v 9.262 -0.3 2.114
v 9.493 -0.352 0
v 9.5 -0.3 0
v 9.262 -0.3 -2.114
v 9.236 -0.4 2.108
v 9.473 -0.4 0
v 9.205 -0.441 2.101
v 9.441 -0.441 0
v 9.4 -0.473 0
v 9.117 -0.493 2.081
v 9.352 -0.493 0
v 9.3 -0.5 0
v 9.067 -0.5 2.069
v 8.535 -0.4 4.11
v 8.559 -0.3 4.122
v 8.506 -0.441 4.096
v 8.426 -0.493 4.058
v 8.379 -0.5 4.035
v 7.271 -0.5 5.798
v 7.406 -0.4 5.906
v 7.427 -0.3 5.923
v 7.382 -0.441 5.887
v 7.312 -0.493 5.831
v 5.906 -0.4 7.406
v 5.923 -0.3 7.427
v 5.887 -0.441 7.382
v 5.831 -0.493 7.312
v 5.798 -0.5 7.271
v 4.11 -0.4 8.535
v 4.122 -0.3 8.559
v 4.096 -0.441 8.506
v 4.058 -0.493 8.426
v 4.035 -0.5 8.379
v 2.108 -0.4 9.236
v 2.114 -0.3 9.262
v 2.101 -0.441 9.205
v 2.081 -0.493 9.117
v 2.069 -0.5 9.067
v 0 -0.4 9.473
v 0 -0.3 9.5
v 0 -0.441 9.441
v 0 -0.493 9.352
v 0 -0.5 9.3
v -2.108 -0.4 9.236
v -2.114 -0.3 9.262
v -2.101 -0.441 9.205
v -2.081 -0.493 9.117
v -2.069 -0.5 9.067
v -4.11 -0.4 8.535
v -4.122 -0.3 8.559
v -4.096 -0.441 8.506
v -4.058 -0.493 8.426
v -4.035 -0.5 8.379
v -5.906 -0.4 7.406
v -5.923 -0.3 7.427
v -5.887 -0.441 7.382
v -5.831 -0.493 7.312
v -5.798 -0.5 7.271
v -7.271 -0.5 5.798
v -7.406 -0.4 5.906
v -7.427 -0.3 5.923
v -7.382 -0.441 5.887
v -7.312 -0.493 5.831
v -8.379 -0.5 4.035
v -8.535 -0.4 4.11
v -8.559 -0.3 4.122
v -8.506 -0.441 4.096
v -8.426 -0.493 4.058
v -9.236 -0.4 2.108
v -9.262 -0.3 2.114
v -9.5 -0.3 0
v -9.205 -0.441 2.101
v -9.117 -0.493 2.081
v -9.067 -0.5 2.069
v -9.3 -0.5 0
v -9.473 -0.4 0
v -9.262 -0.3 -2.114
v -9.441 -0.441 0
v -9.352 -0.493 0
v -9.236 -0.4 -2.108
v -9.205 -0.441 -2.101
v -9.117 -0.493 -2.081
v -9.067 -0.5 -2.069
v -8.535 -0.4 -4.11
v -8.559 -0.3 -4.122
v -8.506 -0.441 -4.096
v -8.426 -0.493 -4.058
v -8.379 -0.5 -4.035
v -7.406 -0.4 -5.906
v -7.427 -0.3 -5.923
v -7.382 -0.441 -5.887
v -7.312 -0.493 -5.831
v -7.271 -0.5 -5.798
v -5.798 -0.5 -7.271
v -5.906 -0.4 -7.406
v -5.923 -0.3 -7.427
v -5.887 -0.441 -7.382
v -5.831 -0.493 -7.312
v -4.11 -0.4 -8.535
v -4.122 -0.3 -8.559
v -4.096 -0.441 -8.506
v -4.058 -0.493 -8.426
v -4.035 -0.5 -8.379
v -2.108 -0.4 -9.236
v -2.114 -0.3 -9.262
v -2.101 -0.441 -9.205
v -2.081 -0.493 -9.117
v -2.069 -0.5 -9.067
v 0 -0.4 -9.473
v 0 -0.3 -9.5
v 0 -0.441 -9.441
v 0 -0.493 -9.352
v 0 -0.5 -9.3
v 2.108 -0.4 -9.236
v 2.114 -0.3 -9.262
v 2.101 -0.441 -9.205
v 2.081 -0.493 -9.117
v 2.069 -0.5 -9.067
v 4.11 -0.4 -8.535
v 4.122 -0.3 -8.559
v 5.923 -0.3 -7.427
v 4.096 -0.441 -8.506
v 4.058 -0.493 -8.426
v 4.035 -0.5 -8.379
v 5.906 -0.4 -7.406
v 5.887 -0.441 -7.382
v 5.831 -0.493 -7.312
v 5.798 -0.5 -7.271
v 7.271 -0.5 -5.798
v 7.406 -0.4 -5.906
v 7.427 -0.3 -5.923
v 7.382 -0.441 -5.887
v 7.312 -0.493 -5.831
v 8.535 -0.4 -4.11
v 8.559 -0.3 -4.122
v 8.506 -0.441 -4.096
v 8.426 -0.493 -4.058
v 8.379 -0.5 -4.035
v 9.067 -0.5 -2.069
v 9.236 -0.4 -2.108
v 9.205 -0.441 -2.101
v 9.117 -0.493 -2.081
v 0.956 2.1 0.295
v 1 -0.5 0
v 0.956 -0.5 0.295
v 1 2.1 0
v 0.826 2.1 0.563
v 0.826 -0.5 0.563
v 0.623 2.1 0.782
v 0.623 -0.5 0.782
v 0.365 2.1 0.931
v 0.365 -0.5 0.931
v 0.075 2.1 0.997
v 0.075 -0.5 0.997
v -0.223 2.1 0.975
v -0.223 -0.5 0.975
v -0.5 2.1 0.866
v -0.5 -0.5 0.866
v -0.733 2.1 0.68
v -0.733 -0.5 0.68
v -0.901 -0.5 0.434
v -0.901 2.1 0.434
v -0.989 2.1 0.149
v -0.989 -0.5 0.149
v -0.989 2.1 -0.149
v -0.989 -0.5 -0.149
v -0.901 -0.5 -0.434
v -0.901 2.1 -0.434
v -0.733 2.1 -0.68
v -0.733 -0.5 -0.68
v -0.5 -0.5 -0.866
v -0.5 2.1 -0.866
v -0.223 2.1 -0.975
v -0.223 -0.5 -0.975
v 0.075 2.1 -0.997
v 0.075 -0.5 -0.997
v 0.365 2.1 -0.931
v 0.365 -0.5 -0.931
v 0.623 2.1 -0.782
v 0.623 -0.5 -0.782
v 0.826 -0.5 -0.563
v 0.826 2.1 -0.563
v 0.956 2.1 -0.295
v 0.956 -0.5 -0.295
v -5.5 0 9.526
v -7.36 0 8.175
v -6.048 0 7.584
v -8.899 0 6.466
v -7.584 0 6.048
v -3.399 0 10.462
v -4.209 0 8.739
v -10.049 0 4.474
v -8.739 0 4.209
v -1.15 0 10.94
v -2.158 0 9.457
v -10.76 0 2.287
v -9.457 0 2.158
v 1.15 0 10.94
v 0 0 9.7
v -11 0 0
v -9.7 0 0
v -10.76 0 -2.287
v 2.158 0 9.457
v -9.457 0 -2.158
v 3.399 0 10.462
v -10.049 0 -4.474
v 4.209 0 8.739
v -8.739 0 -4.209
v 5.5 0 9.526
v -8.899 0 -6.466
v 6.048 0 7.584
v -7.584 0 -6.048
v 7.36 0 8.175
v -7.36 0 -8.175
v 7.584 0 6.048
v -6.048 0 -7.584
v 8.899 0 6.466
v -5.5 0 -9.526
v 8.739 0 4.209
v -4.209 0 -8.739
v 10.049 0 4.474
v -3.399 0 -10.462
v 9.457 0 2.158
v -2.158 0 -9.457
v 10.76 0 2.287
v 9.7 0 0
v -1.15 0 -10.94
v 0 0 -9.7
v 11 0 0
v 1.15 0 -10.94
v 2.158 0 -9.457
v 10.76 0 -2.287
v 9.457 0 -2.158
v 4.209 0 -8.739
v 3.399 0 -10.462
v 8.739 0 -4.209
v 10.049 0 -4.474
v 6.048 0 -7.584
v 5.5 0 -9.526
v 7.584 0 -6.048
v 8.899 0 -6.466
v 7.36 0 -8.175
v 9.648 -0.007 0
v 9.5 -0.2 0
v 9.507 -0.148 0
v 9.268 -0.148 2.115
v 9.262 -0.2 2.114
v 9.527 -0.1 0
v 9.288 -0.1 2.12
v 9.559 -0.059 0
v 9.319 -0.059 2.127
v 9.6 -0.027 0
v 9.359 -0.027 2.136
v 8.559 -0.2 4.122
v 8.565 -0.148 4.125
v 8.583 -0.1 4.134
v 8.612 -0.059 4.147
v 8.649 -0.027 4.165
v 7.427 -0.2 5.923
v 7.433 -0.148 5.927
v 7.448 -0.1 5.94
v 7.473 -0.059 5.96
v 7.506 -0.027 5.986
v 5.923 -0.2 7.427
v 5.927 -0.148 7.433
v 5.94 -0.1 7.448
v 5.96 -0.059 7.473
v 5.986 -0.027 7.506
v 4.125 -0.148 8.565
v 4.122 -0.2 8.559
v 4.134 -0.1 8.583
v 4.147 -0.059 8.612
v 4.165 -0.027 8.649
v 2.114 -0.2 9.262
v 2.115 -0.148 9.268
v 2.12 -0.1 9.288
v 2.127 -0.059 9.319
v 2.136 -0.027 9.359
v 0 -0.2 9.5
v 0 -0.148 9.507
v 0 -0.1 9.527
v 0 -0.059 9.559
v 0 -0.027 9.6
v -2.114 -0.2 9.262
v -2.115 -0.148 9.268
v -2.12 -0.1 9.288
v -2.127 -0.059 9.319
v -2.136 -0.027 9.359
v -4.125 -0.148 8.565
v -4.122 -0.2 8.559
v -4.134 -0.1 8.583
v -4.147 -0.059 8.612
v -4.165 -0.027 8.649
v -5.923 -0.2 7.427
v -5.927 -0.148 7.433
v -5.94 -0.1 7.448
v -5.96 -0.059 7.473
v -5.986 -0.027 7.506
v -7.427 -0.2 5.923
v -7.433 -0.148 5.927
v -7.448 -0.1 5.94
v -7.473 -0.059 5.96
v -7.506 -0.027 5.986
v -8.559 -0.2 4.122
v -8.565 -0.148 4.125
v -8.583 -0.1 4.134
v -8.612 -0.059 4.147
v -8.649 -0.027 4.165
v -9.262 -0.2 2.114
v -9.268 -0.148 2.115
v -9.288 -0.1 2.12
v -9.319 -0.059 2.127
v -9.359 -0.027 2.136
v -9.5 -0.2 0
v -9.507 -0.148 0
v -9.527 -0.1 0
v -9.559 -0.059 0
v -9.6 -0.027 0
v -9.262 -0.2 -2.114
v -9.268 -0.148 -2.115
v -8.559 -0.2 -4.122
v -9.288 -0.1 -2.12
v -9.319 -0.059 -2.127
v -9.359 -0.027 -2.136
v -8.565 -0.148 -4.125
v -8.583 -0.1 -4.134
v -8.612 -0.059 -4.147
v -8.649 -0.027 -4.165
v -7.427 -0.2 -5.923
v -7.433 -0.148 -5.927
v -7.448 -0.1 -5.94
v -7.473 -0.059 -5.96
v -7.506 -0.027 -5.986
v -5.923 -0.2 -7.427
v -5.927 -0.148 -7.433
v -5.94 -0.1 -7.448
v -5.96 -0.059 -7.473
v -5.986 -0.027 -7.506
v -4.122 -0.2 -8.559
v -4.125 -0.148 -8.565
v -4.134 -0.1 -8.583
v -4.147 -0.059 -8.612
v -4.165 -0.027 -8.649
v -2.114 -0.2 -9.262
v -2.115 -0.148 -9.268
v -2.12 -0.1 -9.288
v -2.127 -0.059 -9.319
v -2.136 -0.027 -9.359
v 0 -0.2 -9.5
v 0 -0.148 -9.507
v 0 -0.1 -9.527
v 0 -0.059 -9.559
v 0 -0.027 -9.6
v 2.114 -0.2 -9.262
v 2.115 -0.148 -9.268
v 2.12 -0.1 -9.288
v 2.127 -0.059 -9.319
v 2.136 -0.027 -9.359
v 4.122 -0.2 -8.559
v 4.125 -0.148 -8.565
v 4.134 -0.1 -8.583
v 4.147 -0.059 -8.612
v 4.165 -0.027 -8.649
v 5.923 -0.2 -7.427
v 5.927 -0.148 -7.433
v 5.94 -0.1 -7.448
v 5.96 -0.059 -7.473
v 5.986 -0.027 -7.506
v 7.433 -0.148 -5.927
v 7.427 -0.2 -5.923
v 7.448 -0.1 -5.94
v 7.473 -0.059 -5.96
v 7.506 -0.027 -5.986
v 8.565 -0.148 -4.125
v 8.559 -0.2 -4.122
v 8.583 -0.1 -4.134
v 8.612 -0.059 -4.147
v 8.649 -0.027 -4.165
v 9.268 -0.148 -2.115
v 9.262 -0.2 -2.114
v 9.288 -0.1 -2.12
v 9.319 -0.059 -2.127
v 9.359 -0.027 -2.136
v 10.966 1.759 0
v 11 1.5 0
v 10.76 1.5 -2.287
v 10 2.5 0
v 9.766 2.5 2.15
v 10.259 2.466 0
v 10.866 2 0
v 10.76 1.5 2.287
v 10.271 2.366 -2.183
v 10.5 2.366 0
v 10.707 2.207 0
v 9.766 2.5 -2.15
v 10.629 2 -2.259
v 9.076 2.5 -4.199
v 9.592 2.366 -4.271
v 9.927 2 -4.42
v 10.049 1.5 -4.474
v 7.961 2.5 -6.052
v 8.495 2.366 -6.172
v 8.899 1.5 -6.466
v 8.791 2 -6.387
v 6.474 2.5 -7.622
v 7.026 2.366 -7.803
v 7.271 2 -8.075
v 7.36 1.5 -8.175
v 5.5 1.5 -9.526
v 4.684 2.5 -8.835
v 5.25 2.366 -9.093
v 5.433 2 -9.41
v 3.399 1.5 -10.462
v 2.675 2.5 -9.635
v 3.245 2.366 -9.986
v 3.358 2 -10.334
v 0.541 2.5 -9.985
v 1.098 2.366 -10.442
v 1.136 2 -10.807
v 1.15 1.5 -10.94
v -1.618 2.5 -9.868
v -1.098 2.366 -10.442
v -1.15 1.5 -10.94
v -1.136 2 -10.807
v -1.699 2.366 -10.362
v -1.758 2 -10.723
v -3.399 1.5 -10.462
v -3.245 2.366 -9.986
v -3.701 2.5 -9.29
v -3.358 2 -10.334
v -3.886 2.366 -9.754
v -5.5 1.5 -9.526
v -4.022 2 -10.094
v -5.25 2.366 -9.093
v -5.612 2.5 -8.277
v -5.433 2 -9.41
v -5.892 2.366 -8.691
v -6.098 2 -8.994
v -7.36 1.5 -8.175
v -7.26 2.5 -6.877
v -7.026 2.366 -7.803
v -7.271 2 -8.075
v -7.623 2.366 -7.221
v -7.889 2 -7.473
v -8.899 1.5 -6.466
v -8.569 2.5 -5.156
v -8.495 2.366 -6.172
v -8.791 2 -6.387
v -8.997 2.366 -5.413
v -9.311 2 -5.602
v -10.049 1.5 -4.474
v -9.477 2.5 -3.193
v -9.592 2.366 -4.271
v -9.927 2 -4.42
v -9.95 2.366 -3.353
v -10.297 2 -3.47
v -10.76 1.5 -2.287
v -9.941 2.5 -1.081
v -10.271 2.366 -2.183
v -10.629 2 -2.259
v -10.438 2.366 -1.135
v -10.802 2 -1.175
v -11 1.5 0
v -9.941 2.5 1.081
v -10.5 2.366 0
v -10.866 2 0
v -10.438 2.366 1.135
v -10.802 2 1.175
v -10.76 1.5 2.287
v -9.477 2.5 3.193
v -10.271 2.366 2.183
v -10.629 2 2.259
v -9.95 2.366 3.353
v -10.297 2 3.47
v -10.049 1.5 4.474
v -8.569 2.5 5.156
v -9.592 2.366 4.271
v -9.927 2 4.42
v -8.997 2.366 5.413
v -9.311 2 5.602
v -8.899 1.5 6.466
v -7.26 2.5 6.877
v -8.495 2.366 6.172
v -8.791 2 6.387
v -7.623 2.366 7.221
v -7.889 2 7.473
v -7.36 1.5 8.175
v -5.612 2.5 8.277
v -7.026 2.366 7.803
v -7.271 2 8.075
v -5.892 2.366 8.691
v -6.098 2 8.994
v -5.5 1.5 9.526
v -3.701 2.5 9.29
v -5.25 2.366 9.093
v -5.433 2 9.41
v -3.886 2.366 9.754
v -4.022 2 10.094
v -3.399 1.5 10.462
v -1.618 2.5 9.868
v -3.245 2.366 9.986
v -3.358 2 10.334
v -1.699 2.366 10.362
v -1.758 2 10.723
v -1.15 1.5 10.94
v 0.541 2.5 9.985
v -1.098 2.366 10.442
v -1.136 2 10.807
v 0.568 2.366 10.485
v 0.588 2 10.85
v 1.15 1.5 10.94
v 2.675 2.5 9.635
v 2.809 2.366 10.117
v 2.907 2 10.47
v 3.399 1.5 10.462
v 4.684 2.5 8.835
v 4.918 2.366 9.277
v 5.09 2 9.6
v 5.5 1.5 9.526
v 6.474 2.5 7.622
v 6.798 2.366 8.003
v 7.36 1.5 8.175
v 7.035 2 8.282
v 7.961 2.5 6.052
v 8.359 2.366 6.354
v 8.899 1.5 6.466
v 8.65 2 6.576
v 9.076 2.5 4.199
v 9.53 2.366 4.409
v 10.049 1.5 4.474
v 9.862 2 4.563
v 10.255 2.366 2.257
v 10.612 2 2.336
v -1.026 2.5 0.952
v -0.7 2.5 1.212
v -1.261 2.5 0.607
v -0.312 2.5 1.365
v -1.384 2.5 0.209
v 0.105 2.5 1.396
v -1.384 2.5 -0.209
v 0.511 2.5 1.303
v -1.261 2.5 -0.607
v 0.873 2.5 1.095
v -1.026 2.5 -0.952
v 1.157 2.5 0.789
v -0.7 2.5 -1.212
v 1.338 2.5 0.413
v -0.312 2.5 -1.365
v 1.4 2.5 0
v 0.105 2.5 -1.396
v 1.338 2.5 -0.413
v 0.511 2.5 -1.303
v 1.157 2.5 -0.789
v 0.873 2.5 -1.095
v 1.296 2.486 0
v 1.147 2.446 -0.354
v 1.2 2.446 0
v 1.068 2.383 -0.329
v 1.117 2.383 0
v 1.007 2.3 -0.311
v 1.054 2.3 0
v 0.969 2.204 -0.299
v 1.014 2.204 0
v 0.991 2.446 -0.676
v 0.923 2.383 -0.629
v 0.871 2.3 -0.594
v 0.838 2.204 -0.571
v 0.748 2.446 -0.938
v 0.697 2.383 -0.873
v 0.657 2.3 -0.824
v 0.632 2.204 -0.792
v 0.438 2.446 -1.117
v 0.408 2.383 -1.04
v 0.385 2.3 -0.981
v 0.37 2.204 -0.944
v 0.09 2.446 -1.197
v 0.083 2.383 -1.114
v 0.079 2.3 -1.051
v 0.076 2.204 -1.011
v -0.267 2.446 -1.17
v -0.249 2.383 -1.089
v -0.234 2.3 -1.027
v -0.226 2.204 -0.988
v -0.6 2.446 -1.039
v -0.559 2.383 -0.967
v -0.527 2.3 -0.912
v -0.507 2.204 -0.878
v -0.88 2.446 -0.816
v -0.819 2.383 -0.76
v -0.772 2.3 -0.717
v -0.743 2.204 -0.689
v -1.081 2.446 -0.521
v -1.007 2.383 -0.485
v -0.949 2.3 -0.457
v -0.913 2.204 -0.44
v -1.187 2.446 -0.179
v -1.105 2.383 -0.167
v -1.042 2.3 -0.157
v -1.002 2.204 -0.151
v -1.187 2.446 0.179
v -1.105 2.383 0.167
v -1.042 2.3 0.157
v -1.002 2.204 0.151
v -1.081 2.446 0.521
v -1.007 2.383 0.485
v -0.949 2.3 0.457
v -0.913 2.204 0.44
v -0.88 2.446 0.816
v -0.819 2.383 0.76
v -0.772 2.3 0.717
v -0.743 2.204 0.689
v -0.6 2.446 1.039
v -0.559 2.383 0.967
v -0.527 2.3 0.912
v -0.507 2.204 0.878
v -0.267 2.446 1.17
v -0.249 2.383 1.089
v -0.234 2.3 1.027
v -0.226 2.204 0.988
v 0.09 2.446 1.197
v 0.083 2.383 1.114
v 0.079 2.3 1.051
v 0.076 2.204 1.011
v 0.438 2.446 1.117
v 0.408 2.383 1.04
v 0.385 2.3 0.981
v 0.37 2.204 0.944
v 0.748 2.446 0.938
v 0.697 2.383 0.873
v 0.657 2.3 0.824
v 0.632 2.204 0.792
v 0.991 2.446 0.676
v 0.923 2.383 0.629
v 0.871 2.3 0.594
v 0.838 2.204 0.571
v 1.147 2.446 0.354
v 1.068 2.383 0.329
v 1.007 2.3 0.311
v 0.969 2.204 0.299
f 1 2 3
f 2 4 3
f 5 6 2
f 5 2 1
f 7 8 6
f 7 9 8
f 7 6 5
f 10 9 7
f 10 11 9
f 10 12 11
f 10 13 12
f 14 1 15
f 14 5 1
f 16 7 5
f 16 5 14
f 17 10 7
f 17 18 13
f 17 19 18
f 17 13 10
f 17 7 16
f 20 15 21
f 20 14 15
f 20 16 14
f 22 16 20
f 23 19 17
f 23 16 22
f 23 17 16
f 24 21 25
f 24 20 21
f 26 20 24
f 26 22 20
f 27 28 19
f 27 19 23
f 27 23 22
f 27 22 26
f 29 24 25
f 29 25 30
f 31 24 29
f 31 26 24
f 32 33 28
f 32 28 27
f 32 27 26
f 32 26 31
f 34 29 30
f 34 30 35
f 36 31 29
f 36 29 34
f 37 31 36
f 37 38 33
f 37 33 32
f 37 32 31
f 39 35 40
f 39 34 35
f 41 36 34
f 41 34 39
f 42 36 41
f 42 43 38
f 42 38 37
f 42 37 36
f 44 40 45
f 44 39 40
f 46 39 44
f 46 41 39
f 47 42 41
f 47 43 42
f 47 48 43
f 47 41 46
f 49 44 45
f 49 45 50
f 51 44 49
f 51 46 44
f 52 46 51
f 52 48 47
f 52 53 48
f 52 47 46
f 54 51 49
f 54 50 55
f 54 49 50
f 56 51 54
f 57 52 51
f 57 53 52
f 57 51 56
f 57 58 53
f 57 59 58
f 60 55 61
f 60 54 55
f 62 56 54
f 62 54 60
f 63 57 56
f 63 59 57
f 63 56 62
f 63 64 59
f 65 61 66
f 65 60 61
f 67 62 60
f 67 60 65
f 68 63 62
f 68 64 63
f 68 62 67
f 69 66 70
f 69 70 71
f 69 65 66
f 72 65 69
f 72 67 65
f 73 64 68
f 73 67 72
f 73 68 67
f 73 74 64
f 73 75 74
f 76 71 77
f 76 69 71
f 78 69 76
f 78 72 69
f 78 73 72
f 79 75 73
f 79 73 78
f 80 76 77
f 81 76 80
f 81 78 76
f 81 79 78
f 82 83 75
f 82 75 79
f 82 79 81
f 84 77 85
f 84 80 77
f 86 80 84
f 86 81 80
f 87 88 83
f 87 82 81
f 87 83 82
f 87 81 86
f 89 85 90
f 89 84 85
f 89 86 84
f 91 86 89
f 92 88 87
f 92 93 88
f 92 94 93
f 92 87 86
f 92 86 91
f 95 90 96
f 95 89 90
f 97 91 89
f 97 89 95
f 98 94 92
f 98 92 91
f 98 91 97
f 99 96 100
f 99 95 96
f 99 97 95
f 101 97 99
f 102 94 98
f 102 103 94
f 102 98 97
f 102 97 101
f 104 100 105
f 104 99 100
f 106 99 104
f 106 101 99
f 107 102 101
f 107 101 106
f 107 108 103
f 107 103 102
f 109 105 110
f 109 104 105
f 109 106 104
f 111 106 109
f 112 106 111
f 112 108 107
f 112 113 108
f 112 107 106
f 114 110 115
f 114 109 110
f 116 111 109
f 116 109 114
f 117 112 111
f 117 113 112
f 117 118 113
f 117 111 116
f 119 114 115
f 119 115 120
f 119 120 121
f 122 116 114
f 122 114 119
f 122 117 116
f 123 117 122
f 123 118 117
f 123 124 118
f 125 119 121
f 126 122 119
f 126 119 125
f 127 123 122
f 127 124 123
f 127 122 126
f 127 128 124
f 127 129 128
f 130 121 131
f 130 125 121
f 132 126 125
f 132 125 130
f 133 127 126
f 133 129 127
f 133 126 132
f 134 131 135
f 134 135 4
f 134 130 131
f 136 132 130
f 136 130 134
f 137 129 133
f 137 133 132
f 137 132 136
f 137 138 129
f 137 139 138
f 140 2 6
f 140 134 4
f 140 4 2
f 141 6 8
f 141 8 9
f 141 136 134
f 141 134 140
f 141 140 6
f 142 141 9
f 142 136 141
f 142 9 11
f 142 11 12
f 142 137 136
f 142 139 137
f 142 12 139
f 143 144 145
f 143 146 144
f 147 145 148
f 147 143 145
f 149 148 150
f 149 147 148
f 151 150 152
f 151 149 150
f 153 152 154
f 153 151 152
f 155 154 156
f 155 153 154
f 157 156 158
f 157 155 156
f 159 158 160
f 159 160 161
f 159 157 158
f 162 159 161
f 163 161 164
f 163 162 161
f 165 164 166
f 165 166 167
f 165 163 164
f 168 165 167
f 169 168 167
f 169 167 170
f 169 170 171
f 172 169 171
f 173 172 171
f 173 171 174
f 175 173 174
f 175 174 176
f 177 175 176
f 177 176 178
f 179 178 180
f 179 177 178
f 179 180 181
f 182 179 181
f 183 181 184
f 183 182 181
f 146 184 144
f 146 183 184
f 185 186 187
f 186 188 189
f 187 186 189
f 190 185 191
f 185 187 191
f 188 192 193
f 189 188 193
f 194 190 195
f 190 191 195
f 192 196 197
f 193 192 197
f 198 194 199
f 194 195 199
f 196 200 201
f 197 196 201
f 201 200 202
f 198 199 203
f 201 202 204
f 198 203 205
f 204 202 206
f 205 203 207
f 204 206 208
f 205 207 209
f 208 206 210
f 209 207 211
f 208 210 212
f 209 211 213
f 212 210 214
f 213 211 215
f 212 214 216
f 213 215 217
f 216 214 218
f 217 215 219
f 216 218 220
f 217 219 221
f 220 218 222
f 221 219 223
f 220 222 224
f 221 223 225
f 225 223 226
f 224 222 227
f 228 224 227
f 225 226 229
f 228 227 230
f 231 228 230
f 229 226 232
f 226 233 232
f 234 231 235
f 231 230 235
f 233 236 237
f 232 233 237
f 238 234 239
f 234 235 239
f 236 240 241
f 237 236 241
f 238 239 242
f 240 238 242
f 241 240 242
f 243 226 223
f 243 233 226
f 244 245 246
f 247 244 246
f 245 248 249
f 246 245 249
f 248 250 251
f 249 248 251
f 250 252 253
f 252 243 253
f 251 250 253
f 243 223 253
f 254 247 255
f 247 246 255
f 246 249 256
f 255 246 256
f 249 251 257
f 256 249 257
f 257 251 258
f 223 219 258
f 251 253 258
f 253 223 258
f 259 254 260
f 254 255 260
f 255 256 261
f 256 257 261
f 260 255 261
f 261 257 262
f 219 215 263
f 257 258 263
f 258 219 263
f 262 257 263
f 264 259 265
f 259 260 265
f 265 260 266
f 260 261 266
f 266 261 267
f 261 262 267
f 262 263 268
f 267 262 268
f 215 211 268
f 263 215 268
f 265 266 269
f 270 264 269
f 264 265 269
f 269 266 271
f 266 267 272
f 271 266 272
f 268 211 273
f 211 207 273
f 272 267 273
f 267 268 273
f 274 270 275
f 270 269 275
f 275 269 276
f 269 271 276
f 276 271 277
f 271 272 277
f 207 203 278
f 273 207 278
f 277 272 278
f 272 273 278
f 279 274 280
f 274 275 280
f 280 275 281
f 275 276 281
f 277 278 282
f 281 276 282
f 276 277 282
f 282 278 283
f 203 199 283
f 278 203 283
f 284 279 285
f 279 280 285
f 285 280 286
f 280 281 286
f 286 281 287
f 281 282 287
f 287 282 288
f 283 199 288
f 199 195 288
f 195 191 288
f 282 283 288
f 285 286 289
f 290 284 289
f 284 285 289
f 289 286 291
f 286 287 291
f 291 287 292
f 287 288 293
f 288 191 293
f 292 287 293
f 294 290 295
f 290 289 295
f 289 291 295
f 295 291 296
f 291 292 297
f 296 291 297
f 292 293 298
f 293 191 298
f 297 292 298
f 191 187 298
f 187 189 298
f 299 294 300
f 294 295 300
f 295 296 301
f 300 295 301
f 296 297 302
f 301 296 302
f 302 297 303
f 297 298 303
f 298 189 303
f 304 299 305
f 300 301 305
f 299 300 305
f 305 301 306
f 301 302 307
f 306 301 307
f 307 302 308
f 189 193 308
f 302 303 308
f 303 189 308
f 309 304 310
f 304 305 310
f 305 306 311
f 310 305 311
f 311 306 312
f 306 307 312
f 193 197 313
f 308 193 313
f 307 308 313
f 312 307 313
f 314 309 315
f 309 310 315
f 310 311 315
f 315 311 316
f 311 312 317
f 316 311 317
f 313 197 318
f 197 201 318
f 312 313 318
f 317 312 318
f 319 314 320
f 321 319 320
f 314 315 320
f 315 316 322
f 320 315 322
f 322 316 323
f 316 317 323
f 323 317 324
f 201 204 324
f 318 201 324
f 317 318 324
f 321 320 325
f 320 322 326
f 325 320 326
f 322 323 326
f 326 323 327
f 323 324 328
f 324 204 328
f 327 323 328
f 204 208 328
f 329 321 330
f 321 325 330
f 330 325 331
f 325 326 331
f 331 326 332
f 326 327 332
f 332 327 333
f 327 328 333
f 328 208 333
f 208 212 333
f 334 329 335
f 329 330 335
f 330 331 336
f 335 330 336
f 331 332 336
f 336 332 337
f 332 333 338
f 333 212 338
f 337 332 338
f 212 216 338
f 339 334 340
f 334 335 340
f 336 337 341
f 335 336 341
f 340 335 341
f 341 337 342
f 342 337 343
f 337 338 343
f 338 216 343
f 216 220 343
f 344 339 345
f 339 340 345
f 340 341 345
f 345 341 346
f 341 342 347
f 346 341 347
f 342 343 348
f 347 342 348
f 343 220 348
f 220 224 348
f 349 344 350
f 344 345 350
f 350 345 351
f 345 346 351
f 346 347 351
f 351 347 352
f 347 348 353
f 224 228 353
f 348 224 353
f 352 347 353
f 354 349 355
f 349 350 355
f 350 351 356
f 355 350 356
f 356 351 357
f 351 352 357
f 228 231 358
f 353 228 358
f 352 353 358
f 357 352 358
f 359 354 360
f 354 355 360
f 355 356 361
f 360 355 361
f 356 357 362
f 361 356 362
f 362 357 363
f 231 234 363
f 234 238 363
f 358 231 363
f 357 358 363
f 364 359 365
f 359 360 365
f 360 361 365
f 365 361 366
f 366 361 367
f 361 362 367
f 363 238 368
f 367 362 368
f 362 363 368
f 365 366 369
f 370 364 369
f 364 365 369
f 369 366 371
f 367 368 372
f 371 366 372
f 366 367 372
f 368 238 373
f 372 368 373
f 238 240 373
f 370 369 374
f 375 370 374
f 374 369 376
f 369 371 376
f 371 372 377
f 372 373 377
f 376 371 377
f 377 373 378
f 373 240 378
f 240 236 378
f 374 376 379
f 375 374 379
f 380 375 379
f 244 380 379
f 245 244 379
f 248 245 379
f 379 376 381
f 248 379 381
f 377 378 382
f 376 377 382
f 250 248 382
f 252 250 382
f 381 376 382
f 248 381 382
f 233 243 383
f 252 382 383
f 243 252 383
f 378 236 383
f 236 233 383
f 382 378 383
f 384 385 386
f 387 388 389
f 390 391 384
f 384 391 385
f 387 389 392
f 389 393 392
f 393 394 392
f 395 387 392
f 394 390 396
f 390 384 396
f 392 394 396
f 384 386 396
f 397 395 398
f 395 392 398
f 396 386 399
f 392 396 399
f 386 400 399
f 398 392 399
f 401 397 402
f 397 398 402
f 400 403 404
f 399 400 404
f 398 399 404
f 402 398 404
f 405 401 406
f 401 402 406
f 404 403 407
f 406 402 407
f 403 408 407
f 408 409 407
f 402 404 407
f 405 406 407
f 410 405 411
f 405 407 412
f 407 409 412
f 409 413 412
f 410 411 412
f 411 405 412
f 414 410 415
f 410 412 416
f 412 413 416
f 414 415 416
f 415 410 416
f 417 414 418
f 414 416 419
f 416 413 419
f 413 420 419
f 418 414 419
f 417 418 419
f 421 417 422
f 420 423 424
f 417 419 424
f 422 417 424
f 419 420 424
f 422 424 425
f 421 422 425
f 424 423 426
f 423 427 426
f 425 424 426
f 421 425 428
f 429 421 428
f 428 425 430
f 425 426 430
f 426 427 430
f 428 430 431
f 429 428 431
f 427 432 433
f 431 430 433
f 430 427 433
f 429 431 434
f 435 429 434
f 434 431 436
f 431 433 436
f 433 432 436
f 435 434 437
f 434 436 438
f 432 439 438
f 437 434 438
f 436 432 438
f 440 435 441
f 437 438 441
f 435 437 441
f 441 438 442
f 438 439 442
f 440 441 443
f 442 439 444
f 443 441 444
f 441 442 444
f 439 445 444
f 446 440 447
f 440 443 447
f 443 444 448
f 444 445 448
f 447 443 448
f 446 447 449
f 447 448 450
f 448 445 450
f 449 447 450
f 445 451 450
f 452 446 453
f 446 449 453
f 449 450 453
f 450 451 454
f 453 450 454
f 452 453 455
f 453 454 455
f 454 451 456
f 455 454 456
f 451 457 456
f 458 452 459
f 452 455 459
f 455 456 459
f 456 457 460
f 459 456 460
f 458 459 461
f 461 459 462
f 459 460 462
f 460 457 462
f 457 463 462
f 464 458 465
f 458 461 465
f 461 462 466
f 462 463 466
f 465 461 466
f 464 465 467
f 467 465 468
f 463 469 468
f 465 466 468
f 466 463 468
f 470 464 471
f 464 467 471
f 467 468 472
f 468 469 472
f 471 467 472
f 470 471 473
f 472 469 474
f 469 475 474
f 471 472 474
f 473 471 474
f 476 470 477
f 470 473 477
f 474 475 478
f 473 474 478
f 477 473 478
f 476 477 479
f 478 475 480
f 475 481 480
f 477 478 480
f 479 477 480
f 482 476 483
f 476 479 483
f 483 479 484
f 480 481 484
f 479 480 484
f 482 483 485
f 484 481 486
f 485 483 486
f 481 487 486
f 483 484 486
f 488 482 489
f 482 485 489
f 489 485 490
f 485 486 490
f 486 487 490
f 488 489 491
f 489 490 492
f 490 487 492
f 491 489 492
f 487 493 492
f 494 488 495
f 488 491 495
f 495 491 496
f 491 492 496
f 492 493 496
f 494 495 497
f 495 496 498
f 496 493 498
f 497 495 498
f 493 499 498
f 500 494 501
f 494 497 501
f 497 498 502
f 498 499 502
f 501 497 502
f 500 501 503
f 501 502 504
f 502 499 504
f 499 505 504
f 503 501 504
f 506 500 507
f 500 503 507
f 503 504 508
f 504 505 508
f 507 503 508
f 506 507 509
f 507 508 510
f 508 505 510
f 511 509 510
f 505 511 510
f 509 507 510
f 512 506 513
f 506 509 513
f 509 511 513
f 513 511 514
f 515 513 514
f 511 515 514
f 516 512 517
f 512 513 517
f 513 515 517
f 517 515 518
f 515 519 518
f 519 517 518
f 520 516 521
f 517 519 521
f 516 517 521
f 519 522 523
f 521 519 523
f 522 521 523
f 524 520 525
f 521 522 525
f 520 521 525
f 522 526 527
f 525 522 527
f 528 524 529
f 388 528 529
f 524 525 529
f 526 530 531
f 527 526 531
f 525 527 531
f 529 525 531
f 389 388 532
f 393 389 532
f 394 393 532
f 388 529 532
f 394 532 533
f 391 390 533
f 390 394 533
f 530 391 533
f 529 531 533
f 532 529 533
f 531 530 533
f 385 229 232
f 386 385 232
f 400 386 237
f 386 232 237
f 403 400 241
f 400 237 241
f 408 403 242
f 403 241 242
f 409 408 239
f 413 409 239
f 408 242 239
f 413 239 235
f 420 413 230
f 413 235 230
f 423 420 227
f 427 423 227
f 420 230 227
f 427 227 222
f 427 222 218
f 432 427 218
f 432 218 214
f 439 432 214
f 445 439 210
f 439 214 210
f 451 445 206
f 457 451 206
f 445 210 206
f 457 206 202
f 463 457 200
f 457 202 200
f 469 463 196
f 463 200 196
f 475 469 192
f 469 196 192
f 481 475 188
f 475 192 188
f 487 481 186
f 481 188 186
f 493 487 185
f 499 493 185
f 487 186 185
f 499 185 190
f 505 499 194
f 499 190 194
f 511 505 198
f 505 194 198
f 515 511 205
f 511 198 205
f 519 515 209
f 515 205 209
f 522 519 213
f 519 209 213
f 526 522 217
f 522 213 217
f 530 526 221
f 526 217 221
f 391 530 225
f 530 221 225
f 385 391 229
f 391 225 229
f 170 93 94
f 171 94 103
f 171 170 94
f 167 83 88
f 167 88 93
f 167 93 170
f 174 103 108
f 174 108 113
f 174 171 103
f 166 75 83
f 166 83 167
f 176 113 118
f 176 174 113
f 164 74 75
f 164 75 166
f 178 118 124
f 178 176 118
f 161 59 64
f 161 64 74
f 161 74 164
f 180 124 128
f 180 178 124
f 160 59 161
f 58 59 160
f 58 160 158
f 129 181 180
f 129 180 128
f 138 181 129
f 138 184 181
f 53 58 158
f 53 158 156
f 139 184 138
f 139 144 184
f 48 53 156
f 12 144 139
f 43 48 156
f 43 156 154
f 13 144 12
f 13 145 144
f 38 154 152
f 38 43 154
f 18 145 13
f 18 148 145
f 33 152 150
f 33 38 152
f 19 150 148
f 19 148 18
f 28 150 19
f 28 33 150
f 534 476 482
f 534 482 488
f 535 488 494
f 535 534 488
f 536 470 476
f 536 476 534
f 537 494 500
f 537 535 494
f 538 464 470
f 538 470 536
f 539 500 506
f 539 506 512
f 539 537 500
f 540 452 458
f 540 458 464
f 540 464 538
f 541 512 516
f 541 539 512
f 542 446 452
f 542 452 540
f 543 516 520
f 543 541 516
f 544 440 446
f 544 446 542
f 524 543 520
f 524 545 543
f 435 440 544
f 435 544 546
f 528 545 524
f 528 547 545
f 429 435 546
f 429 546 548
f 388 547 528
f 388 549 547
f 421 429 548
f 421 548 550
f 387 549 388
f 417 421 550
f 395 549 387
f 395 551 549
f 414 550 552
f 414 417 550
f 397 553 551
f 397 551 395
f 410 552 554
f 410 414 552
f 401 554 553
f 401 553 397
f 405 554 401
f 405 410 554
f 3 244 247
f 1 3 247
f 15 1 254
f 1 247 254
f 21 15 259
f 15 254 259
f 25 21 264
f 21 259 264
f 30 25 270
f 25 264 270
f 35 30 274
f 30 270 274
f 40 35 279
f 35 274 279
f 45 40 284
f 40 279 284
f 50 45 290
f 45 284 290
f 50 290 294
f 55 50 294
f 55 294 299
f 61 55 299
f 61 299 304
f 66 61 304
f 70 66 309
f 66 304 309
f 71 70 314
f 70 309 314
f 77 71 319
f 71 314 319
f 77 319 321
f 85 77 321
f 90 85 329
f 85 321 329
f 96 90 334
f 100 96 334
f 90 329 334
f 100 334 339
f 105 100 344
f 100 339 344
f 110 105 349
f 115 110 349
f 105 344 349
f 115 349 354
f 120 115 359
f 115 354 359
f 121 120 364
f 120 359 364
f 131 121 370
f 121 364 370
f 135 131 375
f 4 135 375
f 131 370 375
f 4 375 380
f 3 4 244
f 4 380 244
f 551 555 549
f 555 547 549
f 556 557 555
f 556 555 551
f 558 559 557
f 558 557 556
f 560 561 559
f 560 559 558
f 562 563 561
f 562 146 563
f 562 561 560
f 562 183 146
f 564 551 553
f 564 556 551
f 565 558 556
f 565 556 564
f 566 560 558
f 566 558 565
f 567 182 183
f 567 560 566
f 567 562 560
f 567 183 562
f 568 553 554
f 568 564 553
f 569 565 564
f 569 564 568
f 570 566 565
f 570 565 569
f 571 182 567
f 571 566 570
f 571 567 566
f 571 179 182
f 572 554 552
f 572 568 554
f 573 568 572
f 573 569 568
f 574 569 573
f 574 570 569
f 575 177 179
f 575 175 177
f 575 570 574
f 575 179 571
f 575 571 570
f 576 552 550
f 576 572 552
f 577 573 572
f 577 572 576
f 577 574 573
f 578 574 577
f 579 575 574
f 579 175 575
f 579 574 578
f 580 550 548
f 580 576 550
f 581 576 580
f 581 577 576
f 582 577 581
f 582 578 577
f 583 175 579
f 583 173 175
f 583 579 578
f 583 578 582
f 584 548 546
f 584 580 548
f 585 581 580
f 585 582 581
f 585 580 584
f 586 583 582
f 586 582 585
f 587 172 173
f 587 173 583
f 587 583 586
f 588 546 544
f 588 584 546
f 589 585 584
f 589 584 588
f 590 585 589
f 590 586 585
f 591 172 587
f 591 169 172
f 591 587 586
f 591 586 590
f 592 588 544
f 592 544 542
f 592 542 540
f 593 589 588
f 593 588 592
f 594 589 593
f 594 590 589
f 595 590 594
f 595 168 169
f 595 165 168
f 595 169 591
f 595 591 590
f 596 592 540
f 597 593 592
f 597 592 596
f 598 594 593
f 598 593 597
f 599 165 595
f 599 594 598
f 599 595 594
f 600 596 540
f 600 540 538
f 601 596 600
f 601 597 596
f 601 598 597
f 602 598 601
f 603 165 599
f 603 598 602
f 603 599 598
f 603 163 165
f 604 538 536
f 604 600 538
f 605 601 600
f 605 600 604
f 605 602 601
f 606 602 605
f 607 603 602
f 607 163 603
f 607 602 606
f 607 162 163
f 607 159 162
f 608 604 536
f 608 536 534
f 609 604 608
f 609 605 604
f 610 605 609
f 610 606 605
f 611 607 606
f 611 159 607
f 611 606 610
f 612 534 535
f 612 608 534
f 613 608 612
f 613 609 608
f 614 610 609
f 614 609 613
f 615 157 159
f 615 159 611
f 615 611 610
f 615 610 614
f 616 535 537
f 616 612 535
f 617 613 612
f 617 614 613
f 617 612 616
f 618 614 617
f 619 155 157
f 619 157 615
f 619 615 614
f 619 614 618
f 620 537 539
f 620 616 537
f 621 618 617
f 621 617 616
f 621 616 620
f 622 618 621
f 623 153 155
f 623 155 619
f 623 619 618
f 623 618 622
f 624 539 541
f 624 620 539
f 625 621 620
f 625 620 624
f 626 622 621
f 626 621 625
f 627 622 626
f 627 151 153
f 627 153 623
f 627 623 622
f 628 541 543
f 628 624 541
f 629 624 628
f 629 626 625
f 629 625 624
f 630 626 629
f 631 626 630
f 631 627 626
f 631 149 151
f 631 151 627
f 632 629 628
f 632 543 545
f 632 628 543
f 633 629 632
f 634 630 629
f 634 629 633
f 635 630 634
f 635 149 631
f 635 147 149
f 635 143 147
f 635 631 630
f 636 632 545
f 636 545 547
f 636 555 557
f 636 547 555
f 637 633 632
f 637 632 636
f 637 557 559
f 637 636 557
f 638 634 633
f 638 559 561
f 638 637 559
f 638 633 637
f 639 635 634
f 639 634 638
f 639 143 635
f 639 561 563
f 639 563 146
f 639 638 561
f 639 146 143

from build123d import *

# Parameters (mm, degrees)
SKETCH_1_R          = 11
EXTRUDE_1_DEPTH     = 2.5
SKETCH_2_R          = 1
CUT_EXTRUDE_1_DEPTH = 3.5
FILLET_1_R          = 0.4
FILLET_2_R          = 1
SKETCH_3_R          = 9.5
SKETCH_3_R_2        = 1
EXTRUDE_2_DEPTH     = 0.5
FILLET_3_R          = 0.2


with BuildPart() as part:
    # 草图1 → 凸台-拉伸1 (new body)
    with BuildSketch(Plane(origin=(0, 0, 0), x_dir=(1, 0, 0), z_dir=(0, 1, 0))):
        Circle(SKETCH_1_R)
    extrude(amount=EXTRUDE_1_DEPTH)

    # 草图2 → 切除-拉伸1 (cut, through all)
    with BuildSketch(Plane(origin=(0, 2.5, 0), x_dir=(1, 0, 0), z_dir=(0, 1, 0))):
        Circle(SKETCH_2_R)
    extrude(amount=-CUT_EXTRUDE_1_DEPTH, mode=Mode.SUBTRACT)

    # 圆角1
    fillet_1_edges = [part.edges().sort_by_distance(p)[0] for p in [
        (-1, 2.5, 0),
    ]]
    fillet(fillet_1_edges, radius=FILLET_1_R)

    # 圆角2
    fillet_2_edges = [part.edges().sort_by_distance(p)[0] for p in [
        (-11, 2.5, 0),
    ]]
    fillet(fillet_2_edges, radius=FILLET_2_R)

    # 草图3 → 凸台-拉伸2 (add)
    with BuildSketch(Plane.XZ):
        Circle(SKETCH_3_R)
        Circle(SKETCH_3_R_2, mode=Mode.SUBTRACT)
    extrude(amount=EXTRUDE_2_DEPTH)

    # 圆角3
    fillet_3_edges = [part.edges().sort_by_distance(p)[0] for p in [
        (-9.5, 0, 0),
        (-9.5, -0.5, 0),
    ]]
    fillet(fillet_3_edges, radius=FILLET_3_R)


solid = part.part
